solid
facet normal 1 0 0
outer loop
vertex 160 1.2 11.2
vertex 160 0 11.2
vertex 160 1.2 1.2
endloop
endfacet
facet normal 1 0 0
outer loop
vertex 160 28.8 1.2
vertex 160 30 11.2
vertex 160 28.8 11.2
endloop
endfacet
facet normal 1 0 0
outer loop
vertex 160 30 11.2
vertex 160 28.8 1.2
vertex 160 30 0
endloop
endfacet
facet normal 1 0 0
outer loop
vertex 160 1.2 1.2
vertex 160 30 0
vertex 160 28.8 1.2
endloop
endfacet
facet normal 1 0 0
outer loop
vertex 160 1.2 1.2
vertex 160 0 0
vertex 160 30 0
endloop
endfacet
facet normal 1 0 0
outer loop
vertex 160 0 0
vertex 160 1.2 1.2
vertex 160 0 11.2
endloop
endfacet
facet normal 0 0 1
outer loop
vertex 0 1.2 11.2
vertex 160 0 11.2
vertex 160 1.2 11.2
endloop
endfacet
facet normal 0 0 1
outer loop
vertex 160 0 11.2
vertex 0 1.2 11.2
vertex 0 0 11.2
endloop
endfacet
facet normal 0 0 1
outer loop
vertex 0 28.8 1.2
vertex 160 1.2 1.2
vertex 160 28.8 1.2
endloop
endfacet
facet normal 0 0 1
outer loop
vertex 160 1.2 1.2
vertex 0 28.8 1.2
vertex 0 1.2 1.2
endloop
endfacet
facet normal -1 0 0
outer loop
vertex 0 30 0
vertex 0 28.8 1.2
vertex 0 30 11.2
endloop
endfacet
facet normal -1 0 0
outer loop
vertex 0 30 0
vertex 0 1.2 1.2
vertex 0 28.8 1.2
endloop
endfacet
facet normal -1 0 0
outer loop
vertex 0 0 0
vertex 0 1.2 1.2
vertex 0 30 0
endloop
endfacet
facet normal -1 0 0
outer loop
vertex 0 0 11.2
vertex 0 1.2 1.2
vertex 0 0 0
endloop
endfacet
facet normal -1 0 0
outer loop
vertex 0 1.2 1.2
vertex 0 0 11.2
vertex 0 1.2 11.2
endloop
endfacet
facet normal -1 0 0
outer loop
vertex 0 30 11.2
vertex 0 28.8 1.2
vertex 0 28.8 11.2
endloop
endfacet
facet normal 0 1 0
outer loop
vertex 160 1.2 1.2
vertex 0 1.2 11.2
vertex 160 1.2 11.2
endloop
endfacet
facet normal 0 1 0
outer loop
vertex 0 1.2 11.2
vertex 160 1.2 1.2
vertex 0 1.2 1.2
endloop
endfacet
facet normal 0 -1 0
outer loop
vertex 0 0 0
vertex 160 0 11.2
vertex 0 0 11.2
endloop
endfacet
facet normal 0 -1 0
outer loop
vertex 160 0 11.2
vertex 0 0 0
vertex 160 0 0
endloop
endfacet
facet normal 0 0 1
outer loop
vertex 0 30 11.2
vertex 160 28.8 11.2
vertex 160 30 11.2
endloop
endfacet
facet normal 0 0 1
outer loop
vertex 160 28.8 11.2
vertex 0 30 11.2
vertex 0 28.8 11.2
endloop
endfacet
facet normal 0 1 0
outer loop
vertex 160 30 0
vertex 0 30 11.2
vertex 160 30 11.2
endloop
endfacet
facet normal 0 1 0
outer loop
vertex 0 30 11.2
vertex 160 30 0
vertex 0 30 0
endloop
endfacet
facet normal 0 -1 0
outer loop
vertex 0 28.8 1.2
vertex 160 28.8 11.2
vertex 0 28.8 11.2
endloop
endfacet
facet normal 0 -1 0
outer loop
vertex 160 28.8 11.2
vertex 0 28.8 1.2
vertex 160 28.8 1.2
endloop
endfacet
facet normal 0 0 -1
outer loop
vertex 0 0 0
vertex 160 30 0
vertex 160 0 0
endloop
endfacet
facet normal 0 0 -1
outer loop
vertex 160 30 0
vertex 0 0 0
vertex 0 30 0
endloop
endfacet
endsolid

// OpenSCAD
// ScienceClaw nominal U-channel. All dimensions in millimeters.
// Clamp the first clamp_length along x. No holes or clamp reinforcement.
// Print parameters, layer orientation, material batch, and actual dimensions
// must be recorded separately; this file does not prescribe a qualified process.
length = 160;
clamp_length = 25;
base_width = 30;
wall_height = 10;
thickness = 1.2;
assert(length > clamp_length && clamp_length > 0);
assert(base_width > 2 * thickness && thickness > 0 && wall_height >= 0);
union() {
    cube([length, base_width, thickness]);
    if (wall_height > 0) {
        translate([0, 0, thickness]) cube([length, thickness, wall_height]);
        translate([0, base_width - thickness, thickness]) cube([length, thickness, wall_height]);
    }
}
